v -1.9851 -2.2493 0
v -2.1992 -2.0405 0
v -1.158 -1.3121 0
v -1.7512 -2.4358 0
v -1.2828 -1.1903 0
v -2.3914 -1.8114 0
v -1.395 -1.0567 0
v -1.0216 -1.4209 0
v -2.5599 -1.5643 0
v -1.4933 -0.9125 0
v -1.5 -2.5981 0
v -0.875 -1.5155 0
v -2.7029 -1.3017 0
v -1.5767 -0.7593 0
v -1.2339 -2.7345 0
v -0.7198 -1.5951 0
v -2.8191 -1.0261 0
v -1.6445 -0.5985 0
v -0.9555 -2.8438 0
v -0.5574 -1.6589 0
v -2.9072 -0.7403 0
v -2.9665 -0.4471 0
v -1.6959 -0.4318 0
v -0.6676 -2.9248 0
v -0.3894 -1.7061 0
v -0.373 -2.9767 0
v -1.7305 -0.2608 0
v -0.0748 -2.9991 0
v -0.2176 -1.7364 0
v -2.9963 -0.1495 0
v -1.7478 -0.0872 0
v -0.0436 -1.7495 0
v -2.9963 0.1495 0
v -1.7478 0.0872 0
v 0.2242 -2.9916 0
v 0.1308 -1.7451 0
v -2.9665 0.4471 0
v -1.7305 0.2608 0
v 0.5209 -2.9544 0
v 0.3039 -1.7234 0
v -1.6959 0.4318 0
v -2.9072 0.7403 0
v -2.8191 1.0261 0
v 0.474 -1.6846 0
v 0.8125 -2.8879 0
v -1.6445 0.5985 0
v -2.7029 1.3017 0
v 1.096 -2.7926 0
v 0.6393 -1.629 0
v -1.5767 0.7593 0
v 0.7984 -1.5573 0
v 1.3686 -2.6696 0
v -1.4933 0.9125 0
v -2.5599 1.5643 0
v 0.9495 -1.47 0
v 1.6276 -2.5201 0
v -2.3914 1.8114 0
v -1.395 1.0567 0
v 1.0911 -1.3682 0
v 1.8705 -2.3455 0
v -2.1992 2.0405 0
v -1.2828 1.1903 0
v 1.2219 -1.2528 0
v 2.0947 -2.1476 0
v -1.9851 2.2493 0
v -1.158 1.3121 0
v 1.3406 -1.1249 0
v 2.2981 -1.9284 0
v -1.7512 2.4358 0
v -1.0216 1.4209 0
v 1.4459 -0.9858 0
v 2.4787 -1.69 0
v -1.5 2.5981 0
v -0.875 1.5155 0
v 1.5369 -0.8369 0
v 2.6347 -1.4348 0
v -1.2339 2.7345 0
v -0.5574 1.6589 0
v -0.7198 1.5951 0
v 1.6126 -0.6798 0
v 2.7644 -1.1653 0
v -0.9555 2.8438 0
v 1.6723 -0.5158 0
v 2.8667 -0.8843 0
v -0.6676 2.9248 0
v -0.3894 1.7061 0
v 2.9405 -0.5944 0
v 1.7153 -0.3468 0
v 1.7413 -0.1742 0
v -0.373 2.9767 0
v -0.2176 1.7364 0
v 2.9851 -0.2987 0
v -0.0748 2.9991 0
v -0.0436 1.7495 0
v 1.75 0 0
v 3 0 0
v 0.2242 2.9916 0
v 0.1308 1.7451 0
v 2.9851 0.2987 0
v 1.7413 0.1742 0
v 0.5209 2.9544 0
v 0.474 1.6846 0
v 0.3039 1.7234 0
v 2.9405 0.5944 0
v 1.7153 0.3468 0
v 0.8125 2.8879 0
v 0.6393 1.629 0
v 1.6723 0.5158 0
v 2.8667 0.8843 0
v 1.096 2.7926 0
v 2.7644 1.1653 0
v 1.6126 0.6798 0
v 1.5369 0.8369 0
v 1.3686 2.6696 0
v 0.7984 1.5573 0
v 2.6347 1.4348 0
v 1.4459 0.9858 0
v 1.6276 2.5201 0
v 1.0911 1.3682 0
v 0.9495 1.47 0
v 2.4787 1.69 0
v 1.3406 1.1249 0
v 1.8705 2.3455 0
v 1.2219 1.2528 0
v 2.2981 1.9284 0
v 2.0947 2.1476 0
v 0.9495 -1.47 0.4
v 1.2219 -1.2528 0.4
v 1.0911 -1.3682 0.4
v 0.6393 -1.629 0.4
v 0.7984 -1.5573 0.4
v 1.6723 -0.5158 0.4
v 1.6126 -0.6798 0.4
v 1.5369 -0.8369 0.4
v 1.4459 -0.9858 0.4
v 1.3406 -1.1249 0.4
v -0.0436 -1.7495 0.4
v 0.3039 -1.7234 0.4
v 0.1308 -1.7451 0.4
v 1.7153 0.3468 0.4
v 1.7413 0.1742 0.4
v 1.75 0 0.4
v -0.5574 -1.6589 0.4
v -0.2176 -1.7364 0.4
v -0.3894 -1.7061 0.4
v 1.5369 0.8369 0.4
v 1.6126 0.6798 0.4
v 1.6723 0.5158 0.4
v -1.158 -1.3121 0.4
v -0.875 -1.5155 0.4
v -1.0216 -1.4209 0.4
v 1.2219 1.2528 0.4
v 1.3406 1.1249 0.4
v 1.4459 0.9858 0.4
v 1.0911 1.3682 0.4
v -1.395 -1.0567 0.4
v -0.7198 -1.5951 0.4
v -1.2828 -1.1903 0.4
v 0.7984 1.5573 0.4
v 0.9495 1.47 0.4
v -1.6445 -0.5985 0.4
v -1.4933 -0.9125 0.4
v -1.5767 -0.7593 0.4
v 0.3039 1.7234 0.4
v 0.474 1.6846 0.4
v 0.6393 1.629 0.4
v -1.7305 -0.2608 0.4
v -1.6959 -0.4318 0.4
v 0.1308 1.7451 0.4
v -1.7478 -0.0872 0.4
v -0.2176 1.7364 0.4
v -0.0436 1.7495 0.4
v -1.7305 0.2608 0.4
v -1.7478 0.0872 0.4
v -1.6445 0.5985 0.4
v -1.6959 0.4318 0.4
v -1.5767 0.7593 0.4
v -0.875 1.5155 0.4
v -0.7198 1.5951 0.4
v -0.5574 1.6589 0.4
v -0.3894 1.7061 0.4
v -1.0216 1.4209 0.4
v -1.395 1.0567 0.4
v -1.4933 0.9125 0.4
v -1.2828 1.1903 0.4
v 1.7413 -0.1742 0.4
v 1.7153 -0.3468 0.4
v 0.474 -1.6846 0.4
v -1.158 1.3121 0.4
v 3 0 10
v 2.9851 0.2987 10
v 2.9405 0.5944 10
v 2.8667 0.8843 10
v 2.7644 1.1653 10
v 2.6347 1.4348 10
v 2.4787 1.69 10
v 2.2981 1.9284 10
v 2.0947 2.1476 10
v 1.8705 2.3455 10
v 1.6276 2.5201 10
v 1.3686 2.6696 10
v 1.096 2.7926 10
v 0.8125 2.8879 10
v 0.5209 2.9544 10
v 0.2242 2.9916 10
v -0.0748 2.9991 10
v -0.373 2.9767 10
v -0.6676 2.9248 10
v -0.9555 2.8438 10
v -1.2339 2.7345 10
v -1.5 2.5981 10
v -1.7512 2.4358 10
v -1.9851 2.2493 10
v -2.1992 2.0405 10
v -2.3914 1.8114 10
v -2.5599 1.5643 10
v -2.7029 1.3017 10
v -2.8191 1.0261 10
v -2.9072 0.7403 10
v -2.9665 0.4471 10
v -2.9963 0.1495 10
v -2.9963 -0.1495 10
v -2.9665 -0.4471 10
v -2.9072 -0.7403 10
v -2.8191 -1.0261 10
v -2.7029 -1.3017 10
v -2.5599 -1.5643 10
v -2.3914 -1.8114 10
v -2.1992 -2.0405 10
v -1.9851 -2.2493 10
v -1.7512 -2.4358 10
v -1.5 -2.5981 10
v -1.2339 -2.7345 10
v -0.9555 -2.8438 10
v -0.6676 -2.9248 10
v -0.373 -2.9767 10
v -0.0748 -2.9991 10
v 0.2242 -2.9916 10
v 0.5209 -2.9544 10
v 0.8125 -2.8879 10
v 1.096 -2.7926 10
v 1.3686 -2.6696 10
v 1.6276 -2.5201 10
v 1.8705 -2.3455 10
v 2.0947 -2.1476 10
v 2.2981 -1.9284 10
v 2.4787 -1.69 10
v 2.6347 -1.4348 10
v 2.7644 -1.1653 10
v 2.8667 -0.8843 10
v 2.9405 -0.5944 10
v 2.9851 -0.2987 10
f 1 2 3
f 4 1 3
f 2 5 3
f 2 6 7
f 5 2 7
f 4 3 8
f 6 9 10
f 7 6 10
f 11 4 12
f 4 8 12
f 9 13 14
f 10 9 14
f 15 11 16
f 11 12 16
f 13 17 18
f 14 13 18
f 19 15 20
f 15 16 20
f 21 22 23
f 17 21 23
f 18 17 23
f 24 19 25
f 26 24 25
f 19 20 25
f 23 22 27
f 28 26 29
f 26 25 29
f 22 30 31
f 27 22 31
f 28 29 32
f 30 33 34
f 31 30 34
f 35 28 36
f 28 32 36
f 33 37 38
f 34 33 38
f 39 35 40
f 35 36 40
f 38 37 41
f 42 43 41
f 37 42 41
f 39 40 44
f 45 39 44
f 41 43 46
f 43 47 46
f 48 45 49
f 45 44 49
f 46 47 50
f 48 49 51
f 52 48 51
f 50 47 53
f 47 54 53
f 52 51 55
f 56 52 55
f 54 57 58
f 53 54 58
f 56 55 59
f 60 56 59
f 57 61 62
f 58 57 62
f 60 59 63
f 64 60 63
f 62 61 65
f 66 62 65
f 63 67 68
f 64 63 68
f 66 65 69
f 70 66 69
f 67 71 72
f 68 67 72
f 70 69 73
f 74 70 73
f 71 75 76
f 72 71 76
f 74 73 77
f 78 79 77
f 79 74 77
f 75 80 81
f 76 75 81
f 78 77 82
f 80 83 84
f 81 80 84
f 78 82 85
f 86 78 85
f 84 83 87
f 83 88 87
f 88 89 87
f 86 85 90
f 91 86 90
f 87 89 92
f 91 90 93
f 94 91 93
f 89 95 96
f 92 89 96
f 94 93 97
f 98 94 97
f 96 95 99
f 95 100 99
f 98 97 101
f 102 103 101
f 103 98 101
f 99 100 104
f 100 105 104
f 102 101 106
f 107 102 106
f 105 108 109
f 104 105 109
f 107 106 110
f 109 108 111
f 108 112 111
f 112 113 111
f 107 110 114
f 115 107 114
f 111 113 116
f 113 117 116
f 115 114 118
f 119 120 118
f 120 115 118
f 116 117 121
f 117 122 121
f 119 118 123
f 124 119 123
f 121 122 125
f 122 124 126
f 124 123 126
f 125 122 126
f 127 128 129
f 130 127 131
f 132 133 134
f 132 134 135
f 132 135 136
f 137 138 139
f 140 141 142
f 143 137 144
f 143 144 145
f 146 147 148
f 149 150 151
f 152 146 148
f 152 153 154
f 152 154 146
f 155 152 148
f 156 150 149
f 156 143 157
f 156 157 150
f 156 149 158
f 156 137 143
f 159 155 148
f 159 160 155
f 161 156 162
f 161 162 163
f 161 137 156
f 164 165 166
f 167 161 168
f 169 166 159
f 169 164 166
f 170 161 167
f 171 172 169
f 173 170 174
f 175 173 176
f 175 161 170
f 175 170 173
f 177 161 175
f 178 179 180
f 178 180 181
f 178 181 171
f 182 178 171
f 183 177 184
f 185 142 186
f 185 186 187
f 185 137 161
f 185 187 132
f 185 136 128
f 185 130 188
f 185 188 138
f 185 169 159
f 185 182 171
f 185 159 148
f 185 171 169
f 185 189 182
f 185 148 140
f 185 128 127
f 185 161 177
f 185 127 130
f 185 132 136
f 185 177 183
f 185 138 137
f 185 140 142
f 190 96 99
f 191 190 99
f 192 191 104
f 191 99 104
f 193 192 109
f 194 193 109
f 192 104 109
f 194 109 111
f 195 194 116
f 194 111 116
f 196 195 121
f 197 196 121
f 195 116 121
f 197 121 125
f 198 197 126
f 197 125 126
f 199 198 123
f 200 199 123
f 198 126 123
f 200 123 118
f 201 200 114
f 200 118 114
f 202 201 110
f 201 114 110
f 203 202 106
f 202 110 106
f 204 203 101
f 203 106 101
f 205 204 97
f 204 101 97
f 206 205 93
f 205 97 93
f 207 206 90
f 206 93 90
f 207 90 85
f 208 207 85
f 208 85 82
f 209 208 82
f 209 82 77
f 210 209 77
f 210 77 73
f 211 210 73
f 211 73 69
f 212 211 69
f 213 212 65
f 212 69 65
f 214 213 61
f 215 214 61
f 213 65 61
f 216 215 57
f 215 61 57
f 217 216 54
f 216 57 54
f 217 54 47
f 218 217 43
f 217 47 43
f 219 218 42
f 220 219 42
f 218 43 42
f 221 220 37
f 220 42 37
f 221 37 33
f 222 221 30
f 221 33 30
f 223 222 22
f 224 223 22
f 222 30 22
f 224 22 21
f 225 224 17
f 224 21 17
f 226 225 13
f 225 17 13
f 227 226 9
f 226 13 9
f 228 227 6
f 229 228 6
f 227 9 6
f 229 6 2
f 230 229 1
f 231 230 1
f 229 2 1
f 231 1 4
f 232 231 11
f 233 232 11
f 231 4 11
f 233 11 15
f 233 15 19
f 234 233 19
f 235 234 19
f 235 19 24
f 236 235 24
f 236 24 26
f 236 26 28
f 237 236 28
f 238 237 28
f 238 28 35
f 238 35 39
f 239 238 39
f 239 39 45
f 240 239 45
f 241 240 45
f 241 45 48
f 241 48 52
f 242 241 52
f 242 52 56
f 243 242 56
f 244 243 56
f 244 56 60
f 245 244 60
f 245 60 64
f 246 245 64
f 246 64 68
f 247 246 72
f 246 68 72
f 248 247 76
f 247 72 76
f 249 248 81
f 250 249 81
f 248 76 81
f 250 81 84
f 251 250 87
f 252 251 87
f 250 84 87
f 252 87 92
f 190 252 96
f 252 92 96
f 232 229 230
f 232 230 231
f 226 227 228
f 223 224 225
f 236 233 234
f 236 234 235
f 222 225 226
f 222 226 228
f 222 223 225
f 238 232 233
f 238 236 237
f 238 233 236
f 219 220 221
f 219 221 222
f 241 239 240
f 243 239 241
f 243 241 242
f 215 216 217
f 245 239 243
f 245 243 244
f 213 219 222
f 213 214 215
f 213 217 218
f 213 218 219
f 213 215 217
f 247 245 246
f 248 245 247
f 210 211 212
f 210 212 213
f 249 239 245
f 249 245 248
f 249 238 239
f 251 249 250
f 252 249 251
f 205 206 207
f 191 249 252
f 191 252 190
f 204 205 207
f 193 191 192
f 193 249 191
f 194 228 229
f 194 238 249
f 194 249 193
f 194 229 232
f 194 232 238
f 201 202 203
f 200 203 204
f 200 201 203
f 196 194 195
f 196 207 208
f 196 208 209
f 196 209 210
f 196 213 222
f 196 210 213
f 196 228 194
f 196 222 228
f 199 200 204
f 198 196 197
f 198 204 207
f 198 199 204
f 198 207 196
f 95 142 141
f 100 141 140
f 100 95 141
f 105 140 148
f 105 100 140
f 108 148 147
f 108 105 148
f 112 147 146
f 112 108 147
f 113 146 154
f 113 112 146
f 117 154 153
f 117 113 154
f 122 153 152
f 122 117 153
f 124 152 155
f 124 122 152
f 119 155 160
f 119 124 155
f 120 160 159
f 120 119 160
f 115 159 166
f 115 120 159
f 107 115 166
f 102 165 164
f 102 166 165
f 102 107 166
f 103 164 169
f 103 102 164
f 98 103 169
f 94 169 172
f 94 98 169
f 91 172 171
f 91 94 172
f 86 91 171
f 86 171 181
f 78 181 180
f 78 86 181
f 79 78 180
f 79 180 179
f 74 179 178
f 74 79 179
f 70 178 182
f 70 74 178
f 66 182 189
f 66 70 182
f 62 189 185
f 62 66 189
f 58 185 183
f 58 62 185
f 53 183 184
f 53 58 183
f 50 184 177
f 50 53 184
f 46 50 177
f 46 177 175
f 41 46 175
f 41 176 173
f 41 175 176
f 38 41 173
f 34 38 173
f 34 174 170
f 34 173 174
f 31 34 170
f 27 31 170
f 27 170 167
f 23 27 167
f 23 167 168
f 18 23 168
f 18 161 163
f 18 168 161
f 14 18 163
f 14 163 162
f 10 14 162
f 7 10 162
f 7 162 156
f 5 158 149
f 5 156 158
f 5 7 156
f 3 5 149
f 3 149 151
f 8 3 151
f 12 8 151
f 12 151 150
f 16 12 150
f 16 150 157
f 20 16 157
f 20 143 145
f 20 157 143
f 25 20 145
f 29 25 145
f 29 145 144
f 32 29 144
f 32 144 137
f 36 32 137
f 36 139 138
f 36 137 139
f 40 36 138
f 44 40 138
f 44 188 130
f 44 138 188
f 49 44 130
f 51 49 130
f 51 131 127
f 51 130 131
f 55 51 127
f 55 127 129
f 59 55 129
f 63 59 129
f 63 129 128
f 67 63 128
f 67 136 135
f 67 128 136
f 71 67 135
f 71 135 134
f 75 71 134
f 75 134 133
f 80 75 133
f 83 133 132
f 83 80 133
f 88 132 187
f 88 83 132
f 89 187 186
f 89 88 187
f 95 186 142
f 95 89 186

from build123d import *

# Parameters (mm, degrees)
SKETCH1_R           = 3
BOSS_EXTRUDE1_DEPTH = 10
SKETCH2_R           = 1.75
CUT_EXTRUDE1_DEPTH  = 0.5
BOSS_EXTRUDE2_START = 0.1
SKETCH3_R           = 1.75
BOSS_EXTRUDE2_DEPTH = 0.1


with BuildPart() as part:
    # Sketch1 → Boss-Extrude1 (new body)
    with BuildSketch(Plane.XY):
        Circle(SKETCH1_R)
    extrude(amount=BOSS_EXTRUDE1_DEPTH)

    # Sketch2 → Cut-Extrude1 (cut)
    with BuildSketch(Plane.XY):
        Circle(SKETCH2_R)
    extrude(amount=CUT_EXTRUDE1_DEPTH, mode=Mode.SUBTRACT)

    # Sketch3 → Boss-Extrude2 (add)
    with BuildSketch(Plane(origin=(0, 0, 0.5), x_dir=(-1, 0, 0), z_dir=(0, 0, -1)).offset(BOSS_EXTRUDE2_START)):
        Circle(SKETCH3_R)
    extrude(amount=-BOSS_EXTRUDE2_DEPTH)


solid = part.part
